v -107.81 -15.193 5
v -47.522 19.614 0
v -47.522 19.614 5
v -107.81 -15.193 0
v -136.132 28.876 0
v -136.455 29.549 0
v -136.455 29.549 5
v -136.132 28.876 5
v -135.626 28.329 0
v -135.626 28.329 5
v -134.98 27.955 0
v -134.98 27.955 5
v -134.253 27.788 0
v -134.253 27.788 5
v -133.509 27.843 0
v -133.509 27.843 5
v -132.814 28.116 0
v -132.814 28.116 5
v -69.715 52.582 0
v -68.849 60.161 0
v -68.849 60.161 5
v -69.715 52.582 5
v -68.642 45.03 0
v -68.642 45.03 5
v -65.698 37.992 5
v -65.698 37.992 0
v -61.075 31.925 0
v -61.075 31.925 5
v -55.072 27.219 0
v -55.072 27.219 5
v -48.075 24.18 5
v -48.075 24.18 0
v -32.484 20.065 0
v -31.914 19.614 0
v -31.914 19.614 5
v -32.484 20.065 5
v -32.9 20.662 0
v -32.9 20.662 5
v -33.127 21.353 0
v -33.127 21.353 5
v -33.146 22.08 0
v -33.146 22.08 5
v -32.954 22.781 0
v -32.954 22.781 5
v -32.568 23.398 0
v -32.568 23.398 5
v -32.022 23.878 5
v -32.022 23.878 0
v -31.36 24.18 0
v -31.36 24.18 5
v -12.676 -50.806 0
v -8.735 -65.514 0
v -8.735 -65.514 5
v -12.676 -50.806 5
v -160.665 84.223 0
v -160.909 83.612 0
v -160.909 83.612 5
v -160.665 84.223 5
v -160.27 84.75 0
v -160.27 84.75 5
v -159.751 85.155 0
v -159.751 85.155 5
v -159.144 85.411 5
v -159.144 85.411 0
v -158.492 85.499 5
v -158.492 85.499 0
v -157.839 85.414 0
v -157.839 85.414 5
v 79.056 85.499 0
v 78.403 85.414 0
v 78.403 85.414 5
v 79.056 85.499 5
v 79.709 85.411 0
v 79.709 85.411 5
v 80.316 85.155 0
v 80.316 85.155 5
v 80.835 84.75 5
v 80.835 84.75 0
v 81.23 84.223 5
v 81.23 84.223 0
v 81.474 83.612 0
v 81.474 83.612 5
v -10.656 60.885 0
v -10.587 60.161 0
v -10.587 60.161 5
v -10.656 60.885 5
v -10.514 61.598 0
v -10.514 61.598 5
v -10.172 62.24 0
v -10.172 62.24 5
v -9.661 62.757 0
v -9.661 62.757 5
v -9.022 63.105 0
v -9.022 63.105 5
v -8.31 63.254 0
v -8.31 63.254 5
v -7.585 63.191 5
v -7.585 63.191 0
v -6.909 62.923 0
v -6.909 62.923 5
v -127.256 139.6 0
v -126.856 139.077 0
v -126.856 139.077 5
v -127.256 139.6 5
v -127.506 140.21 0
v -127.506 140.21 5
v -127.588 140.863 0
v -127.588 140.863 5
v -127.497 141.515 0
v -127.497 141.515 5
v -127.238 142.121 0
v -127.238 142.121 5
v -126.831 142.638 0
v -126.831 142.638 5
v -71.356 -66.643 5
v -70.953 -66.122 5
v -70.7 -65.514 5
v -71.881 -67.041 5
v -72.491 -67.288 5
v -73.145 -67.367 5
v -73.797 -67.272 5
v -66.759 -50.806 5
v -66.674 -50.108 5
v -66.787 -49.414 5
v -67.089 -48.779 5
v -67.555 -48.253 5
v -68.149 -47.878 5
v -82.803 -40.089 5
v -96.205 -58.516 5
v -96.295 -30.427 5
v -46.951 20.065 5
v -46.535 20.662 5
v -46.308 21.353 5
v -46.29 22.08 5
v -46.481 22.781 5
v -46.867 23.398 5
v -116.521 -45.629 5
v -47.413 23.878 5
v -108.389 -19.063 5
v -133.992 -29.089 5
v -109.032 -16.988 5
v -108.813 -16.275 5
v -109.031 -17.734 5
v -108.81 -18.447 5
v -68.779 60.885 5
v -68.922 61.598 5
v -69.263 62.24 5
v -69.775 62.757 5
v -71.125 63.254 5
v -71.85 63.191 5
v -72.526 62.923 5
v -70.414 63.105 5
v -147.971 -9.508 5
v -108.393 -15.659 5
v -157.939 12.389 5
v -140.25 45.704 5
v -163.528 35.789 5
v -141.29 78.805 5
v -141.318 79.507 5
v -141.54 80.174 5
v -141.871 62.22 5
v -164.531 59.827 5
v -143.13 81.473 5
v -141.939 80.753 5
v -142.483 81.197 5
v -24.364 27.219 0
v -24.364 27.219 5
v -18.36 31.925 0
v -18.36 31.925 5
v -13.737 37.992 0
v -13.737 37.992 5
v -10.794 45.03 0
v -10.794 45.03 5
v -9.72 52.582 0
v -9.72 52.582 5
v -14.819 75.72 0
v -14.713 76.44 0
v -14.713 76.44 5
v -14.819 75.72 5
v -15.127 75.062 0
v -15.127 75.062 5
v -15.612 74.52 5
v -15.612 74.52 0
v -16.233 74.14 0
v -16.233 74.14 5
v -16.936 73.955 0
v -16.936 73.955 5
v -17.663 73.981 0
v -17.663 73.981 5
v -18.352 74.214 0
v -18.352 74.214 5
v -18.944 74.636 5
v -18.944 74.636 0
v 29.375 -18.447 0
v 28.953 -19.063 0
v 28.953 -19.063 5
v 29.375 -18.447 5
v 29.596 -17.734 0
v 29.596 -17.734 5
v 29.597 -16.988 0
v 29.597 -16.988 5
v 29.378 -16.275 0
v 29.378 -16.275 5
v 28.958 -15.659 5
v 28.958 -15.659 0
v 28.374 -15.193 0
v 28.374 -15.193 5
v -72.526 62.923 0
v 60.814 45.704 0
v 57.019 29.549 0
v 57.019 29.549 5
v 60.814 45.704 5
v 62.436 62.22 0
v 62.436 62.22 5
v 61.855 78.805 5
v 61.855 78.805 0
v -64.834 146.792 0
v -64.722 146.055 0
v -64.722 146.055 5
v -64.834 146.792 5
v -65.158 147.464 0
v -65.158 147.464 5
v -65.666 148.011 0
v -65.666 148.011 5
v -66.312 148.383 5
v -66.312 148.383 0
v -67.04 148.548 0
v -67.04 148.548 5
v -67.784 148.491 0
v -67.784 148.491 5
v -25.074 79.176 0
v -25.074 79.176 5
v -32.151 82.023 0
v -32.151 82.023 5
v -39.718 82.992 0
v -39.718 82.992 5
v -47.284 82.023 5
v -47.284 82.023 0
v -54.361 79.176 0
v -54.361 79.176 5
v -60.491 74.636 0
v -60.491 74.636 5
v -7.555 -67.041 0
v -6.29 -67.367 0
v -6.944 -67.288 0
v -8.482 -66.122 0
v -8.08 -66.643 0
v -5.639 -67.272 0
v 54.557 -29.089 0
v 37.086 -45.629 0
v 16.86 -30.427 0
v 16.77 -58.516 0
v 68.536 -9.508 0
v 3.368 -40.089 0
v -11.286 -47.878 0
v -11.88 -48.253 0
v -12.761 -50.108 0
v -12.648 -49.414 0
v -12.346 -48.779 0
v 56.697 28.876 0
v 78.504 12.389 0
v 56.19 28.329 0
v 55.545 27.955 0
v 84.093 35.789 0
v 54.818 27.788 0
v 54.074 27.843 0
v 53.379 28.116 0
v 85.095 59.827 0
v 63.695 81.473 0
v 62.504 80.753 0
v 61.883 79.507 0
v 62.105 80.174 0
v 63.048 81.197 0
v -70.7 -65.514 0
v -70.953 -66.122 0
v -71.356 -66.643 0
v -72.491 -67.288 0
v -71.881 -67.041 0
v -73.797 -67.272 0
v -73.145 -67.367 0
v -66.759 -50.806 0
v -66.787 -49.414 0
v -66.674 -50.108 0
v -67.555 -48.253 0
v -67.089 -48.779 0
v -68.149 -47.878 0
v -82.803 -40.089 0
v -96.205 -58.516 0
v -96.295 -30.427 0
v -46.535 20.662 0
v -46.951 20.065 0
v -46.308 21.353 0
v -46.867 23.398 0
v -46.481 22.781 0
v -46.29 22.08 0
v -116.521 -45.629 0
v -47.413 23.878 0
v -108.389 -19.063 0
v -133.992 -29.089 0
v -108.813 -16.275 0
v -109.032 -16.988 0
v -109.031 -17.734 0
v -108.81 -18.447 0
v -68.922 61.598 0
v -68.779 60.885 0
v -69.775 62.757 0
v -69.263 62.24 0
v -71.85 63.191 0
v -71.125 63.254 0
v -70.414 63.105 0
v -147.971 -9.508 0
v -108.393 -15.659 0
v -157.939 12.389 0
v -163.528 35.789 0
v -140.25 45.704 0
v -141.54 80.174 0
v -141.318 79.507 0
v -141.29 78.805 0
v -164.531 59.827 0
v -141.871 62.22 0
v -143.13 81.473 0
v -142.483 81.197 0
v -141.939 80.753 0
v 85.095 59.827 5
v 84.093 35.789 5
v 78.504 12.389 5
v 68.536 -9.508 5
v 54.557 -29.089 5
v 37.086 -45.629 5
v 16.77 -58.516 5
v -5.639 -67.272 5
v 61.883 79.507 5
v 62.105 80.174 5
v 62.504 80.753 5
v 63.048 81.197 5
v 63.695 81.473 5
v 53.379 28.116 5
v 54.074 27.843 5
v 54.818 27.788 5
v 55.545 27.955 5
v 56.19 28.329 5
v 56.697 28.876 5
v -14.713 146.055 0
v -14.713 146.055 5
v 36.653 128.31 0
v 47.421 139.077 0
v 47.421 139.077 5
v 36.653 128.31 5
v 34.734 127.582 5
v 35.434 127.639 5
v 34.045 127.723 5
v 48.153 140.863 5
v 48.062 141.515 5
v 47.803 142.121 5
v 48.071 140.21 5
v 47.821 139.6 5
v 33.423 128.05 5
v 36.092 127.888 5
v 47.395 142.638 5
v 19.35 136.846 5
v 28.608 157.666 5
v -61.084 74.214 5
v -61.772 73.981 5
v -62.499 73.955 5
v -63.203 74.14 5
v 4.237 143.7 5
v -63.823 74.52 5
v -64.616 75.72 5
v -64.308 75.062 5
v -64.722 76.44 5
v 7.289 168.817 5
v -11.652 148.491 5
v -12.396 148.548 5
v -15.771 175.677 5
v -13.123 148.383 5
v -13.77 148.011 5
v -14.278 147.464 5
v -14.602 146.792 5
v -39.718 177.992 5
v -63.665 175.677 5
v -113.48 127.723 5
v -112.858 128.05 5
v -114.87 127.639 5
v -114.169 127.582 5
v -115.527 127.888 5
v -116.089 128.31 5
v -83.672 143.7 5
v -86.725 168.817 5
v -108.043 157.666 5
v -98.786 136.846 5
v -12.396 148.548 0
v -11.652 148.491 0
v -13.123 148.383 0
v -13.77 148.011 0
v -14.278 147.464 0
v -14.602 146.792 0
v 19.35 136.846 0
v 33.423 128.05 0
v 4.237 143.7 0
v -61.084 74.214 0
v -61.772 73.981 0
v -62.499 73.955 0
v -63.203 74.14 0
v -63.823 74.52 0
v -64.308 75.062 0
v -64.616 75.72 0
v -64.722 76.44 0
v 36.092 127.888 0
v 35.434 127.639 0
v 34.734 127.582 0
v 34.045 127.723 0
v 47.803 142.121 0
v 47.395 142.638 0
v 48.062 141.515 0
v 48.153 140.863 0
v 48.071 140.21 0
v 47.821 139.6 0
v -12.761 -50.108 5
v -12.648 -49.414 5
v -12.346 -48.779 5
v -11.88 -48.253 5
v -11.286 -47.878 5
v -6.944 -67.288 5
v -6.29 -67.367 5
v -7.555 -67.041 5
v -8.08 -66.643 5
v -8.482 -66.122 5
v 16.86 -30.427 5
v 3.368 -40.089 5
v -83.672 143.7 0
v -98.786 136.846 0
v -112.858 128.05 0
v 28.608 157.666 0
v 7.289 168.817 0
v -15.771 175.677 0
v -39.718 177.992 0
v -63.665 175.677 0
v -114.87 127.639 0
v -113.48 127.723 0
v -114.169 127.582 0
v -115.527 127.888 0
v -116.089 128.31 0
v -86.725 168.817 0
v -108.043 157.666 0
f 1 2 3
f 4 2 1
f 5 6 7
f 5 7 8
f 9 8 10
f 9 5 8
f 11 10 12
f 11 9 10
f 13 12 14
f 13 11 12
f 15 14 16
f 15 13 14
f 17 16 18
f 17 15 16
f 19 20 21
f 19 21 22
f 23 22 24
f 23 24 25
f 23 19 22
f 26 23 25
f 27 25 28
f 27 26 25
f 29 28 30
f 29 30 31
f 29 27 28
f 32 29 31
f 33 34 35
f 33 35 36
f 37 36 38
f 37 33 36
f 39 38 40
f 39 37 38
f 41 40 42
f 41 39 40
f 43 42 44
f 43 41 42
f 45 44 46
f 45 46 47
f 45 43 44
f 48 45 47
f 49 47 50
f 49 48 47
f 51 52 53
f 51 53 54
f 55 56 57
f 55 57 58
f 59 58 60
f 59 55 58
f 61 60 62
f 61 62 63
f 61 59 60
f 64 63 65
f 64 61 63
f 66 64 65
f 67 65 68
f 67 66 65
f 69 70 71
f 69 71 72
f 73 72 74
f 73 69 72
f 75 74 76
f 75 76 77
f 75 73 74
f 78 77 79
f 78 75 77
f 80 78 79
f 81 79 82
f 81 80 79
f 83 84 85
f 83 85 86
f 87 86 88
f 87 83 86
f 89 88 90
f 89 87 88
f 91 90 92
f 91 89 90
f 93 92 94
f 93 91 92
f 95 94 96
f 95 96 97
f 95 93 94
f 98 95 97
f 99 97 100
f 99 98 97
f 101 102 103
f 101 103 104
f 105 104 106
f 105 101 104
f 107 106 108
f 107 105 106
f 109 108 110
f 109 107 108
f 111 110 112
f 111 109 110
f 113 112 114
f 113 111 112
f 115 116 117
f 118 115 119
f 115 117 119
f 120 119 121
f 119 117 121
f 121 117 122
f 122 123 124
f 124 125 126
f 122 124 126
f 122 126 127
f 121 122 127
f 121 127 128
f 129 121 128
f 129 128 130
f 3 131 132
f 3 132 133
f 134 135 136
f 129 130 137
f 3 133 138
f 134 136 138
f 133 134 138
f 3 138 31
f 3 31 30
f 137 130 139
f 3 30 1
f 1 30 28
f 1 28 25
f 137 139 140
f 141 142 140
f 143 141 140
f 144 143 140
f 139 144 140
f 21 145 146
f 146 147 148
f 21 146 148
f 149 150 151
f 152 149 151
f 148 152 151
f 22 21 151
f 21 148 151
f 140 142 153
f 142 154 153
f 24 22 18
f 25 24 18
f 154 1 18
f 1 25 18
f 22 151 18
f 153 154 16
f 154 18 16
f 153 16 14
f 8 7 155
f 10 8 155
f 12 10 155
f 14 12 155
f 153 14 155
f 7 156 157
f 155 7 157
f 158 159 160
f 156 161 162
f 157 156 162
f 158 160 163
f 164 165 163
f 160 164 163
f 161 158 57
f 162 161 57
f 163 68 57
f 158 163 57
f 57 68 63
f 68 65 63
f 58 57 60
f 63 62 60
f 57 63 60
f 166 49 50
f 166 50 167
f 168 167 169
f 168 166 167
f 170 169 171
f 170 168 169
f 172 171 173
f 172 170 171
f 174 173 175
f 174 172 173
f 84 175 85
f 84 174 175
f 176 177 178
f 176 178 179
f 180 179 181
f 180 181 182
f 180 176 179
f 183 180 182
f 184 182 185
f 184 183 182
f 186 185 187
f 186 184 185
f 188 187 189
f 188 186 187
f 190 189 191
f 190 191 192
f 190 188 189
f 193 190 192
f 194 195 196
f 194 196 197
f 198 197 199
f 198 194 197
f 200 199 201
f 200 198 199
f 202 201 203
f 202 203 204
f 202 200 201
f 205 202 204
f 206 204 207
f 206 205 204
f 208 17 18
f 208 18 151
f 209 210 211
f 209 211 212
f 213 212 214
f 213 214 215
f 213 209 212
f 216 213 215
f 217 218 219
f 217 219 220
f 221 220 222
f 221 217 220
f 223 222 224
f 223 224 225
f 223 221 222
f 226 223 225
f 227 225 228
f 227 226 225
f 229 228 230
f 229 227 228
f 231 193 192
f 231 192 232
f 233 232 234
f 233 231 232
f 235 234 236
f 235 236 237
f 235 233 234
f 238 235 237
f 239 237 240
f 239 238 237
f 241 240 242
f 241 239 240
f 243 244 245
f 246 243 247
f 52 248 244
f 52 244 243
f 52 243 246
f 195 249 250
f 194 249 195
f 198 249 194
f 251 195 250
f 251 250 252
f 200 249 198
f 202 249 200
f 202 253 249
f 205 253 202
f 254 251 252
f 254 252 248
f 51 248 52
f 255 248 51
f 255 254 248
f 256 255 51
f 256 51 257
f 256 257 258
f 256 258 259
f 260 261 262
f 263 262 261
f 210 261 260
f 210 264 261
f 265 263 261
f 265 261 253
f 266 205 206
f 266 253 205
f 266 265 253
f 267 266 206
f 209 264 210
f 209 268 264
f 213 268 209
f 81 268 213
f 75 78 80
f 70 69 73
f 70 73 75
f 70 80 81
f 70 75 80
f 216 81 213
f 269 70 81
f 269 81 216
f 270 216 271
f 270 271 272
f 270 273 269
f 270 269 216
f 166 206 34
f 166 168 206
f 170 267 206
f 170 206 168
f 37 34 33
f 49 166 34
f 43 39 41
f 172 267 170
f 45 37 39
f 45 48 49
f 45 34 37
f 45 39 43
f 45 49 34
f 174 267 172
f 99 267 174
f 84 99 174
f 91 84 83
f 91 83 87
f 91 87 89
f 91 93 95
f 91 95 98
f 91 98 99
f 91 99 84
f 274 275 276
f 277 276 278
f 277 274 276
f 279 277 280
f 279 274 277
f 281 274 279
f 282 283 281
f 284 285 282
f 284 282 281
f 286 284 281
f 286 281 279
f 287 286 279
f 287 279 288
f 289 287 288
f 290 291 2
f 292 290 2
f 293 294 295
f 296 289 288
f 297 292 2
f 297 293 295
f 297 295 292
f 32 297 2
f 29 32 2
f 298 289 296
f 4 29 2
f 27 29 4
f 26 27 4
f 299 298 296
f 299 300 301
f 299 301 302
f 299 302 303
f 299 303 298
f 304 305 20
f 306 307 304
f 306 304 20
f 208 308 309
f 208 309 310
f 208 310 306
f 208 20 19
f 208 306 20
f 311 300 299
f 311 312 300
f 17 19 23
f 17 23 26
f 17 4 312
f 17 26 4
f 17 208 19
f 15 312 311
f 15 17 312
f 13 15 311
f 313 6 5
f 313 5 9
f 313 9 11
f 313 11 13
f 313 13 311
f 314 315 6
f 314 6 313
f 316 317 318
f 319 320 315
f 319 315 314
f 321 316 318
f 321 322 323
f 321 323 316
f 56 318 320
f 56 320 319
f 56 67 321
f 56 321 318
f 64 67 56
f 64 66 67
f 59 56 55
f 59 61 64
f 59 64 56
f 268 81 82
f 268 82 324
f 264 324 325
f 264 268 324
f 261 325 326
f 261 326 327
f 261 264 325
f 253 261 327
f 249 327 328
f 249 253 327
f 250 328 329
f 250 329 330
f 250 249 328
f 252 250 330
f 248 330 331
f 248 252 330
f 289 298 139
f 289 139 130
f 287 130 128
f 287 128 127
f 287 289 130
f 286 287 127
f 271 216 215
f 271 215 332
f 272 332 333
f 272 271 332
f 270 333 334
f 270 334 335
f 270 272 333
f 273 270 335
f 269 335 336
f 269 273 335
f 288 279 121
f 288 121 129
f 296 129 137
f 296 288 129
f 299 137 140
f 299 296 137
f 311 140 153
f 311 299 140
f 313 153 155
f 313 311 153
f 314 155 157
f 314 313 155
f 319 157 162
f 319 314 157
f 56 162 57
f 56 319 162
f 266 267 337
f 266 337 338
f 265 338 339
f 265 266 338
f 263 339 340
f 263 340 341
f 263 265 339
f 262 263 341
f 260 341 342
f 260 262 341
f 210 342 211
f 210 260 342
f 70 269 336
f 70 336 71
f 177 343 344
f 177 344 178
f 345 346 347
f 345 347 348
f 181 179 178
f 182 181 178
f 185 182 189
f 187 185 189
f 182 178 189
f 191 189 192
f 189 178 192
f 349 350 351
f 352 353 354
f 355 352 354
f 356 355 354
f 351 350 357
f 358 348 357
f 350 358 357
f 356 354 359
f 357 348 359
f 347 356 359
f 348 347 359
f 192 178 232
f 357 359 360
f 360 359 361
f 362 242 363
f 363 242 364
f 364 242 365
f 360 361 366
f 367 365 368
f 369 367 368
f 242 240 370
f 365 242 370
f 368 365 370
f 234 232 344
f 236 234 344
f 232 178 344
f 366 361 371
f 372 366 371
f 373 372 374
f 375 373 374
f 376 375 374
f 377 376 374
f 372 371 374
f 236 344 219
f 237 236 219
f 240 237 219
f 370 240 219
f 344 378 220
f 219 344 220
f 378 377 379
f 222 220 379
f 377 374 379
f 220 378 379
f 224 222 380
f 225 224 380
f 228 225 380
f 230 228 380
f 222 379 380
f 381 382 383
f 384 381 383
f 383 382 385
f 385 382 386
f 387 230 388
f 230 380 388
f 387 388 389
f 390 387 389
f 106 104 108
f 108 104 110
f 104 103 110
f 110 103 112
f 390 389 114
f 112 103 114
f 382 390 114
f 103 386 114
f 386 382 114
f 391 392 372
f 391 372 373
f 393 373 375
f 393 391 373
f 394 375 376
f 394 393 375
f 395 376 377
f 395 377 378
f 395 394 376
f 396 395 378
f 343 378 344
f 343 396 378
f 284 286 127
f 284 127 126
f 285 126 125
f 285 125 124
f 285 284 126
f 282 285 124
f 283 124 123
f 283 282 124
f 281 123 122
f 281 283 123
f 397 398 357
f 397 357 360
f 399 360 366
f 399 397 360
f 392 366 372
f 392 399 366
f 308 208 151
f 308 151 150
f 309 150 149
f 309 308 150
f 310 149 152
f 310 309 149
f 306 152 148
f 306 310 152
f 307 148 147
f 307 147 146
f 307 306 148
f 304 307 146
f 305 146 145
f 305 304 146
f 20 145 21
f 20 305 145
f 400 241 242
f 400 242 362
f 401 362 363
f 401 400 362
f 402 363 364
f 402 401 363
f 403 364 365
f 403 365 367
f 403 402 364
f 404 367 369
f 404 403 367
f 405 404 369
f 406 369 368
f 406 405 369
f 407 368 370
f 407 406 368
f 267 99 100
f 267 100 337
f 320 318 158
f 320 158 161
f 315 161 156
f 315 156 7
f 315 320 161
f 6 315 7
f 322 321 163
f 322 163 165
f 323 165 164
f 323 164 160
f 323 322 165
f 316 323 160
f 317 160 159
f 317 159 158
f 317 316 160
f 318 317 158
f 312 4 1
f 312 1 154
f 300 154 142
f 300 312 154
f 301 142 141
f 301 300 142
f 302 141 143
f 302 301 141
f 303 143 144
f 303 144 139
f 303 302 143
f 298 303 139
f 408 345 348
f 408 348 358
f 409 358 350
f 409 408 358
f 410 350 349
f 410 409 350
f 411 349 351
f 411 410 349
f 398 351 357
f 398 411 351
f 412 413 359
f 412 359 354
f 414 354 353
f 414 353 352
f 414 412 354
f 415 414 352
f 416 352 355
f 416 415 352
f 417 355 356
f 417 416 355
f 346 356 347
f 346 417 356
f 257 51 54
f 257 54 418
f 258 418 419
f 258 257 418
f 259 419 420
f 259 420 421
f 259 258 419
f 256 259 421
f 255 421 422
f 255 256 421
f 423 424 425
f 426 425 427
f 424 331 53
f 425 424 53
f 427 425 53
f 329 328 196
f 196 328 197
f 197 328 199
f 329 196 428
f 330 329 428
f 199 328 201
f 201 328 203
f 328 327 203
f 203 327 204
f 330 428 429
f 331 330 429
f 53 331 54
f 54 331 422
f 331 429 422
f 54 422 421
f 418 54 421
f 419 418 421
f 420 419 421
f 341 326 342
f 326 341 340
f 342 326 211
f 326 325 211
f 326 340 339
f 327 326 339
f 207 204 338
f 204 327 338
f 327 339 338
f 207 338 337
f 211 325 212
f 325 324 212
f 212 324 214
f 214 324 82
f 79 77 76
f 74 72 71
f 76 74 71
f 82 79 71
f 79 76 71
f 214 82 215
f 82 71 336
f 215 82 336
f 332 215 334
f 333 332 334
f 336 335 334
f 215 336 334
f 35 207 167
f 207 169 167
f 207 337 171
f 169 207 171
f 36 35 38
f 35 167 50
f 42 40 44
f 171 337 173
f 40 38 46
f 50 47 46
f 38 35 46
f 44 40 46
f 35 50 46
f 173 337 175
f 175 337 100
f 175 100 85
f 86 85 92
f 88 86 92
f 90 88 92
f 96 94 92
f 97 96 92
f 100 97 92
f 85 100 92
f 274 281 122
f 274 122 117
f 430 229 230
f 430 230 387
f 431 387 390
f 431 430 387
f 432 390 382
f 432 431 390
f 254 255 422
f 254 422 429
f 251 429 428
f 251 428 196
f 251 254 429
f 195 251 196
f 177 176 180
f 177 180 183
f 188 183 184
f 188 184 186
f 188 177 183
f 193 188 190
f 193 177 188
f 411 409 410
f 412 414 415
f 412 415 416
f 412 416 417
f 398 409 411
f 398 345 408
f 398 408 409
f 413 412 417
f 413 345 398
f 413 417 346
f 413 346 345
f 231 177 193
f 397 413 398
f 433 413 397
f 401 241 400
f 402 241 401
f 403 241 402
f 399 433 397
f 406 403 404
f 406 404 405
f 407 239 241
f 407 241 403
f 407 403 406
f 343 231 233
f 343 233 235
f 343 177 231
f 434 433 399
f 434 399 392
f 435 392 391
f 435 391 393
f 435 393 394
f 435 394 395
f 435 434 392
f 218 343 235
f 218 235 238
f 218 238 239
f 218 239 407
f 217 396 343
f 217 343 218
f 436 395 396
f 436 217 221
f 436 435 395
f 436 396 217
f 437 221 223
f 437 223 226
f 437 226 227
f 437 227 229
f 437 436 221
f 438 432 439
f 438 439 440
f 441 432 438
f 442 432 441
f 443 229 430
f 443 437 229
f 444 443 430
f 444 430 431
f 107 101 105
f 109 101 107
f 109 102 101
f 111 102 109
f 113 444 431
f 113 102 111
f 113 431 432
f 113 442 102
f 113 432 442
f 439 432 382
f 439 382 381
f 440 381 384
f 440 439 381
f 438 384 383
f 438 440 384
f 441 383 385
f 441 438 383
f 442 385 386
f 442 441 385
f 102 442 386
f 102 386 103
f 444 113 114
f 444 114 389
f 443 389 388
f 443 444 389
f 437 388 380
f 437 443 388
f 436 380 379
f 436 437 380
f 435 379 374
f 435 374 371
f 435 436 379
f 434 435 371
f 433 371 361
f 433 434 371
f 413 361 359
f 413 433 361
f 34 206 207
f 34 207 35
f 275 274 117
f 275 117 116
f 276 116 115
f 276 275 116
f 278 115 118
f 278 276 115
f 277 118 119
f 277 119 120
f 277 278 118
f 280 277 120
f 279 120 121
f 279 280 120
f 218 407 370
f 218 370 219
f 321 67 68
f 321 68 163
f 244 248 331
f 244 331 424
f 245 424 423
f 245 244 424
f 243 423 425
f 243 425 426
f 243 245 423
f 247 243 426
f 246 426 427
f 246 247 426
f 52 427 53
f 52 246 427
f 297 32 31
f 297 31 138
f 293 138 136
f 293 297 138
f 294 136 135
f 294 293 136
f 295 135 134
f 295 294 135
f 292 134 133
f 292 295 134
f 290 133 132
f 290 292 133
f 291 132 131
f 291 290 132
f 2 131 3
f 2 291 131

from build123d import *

# Parameters (mm, degrees)
BOSS_EXTRUDE2_DEPTH   = 5
BOSS_EXTRUDE2_2_DEPTH = 5
BOSS_EXTRUDE2_3_DEPTH = 5


with BuildPart() as part:
    # Sketch1 → Boss-Extrude2 (new body)
    with BuildSketch(Plane.XY):
        with BuildLine():
            ThreePointArc((-141.289999118, 78.804960004), (-141.334529419, 53.935289488), (-136.454710083, 29.549025778))
            ThreePointArc((-136.454710083, 29.549025778), (-134.980013747, 27.954750711), (-132.81426596, 28.115930093))
            Line((-132.81426596, 28.115930093), (-72.526189959, 62.923267002))
            ThreePointArc((-72.526189959, 62.923267002), (-69.774713456, 62.757095263), (-68.848608602, 60.160835301))
            ThreePointArc((-68.848608602, 60.160835301), (-65.698394434, 37.992417004), (-48.075088111, 24.180042358))
            ThreePointArc((-48.075088111, 24.180042358), (-46.289713456, 22.079882047), (-47.52154276, 19.613947629))
            Line((-47.52154276, 19.613947629), (-107.809618762, -15.19338928))
            ThreePointArc((-107.809618762, -15.19338928), (-109.032078095, -16.988392191), (-108.388743554, -19.062654214))
            ThreePointArc((-108.388743554, -19.062654214), (-89.709529345, -35.481833579), (-68.149497745, -47.878104465))
            ThreePointArc((-68.149497745, -47.878104465), (-66.915609368, -49.086045475), (-66.759023055, -50.805662507))
            Line((-66.759023055, -50.805662507), (-70.700152367, -65.514157338))
            ThreePointArc((-70.700152367, -65.514157338), (-71.88050884, -67.041072287), (-73.79654519, -67.272406189))
            ThreePointArc((-73.79654519, -67.272406189), (-147.970807793, -9.507582996), (-160.909480822, 83.611624322))
            ThreePointArc((-160.909480822, 83.611624322), (-159.751121611, 85.155293524), (-157.838596239, 85.414054741))
            Line((-157.838596239, 85.414054741), (-143.130101408, 81.47292543))
            ThreePointArc((-143.130101408, 81.47292543), (-141.71916253, 80.477509189), (-141.289999118, 78.804960004))
        make_face()
    extrude(amount=BOSS_EXTRUDE2_DEPTH)


with BuildPart() as body_2:
    # Sketch1 → Boss-Extrude2 2 (new body)
    with BuildSketch(Plane.XY):
        with BuildLine():
            ThreePointArc((-11.285766896, -47.878104465), (10.274264705, -35.481833579), (28.953478913, -19.062654214))
            ThreePointArc((28.953478913, -19.062654214), (29.596813454, -16.988392191), (28.374354121, -15.19338928))
            Line((28.374354121, -15.19338928), (-31.91372188, 19.613947629))
            ThreePointArc((-31.91372188, 19.613947629), (-33.145551185, 22.079882047), (-31.360176529, 24.180042358))
            ThreePointArc((-31.360176529, 24.180042358), (-13.736870207, 37.992417004), (-10.586656039, 60.160835301))
            ThreePointArc((-10.586656039, 60.160835301), (-9.660551185, 62.757095263), (-6.909074682, 62.923267002))
            Line((-6.909074682, 62.923267002), (53.37900132, 28.115930093))
            ThreePointArc((53.37900132, 28.115930093), (55.544749107, 27.954750711), (57.019445442, 29.549025778))
            ThreePointArc((57.019445442, 29.549025778), (61.899264778, 53.935289488), (61.854734477, 78.804960004))
            ThreePointArc((61.854734477, 78.804960004), (62.28389789, 80.477509189), (63.694836768, 81.47292543))
            Line((63.694836768, 81.47292543), (78.403331598, 85.414054741))
            ThreePointArc((78.403331598, 85.414054741), (80.31585697, 85.155293524), (81.474216181, 83.611624322))
            ThreePointArc((81.474216181, 83.611624322), (68.535543153, -9.507582996), (-5.638719451, -67.272406189))
            ThreePointArc((-5.638719451, -67.272406189), (-7.5547558, -67.041072287), (-8.735112274, -65.514157338))
            Line((-8.735112274, -65.514157338), (-12.676241586, -50.805662507))
            ThreePointArc((-12.676241586, -50.805662507), (-12.519655273, -49.086045475), (-11.285766896, -47.878104465))
        make_face()
    extrude(amount=BOSS_EXTRUDE2_2_DEPTH)


with BuildPart() as body_3:
    # Sketch1 → Boss-Extrude2 3 (new body)
    with BuildSketch(Plane.XY):
        with BuildLine():
            ThreePointArc((-11.651665791, 148.490879447), (-13.769696668, 148.010892491), (-14.712985122, 146.054710198))
            Line((-14.712985122, 146.054710198), (-14.712985122, 76.440036381))
            ThreePointArc((-14.712985122, 76.440036381), (-16.23263232, 74.140273701), (-18.944111829, 74.636373352))
            ThreePointArc((-18.944111829, 74.636373352), (-39.71763232, 82.992417004), (-60.491152811, 74.636373352))
            ThreePointArc((-60.491152811, 74.636373352), (-63.20263232, 74.140273701), (-64.722279519, 76.440036381))
            Line((-64.722279519, 76.440036381), (-64.722279519, 146.054710198))
            ThreePointArc((-64.722279519, 146.054710198), (-65.665567973, 148.010892491), (-67.783598849, 148.490879447))
            ThreePointArc((-67.783598849, 148.490879447), (-91.342632394, 140.523795103), (-112.858133693, 128.050395473))
            ThreePointArc((-112.858133693, 128.050395473), (-114.521185483, 127.585787298), (-116.088710674, 128.309988089))
            Line((-116.088710674, 128.309988089), (-126.856076193, 139.077353608))
            ThreePointArc((-126.856076193, 139.077353608), (-127.588245091, 140.863029774), (-126.830567952, 142.638032879))
            ThreePointArc((-126.830567952, 142.638032879), (-39.71763232, 177.992417004), (47.395303312, 142.638032879))
            ThreePointArc((47.395303312, 142.638032879), (48.15298045, 140.863029774), (47.420811552, 139.077353608))
            Line((47.420811552, 139.077353608), (36.653446033, 128.309988089))
            ThreePointArc((36.653446033, 128.309988089), (35.085920842, 127.585787298), (33.422869053, 128.050395473))
            ThreePointArc((33.422869053, 128.050395473), (11.907367753, 140.523795103), (-11.651665791, 148.490879447))
        make_face()
    extrude(amount=BOSS_EXTRUDE2_3_DEPTH)


solid = Compound([part.part, body_2.part, body_3.part])
